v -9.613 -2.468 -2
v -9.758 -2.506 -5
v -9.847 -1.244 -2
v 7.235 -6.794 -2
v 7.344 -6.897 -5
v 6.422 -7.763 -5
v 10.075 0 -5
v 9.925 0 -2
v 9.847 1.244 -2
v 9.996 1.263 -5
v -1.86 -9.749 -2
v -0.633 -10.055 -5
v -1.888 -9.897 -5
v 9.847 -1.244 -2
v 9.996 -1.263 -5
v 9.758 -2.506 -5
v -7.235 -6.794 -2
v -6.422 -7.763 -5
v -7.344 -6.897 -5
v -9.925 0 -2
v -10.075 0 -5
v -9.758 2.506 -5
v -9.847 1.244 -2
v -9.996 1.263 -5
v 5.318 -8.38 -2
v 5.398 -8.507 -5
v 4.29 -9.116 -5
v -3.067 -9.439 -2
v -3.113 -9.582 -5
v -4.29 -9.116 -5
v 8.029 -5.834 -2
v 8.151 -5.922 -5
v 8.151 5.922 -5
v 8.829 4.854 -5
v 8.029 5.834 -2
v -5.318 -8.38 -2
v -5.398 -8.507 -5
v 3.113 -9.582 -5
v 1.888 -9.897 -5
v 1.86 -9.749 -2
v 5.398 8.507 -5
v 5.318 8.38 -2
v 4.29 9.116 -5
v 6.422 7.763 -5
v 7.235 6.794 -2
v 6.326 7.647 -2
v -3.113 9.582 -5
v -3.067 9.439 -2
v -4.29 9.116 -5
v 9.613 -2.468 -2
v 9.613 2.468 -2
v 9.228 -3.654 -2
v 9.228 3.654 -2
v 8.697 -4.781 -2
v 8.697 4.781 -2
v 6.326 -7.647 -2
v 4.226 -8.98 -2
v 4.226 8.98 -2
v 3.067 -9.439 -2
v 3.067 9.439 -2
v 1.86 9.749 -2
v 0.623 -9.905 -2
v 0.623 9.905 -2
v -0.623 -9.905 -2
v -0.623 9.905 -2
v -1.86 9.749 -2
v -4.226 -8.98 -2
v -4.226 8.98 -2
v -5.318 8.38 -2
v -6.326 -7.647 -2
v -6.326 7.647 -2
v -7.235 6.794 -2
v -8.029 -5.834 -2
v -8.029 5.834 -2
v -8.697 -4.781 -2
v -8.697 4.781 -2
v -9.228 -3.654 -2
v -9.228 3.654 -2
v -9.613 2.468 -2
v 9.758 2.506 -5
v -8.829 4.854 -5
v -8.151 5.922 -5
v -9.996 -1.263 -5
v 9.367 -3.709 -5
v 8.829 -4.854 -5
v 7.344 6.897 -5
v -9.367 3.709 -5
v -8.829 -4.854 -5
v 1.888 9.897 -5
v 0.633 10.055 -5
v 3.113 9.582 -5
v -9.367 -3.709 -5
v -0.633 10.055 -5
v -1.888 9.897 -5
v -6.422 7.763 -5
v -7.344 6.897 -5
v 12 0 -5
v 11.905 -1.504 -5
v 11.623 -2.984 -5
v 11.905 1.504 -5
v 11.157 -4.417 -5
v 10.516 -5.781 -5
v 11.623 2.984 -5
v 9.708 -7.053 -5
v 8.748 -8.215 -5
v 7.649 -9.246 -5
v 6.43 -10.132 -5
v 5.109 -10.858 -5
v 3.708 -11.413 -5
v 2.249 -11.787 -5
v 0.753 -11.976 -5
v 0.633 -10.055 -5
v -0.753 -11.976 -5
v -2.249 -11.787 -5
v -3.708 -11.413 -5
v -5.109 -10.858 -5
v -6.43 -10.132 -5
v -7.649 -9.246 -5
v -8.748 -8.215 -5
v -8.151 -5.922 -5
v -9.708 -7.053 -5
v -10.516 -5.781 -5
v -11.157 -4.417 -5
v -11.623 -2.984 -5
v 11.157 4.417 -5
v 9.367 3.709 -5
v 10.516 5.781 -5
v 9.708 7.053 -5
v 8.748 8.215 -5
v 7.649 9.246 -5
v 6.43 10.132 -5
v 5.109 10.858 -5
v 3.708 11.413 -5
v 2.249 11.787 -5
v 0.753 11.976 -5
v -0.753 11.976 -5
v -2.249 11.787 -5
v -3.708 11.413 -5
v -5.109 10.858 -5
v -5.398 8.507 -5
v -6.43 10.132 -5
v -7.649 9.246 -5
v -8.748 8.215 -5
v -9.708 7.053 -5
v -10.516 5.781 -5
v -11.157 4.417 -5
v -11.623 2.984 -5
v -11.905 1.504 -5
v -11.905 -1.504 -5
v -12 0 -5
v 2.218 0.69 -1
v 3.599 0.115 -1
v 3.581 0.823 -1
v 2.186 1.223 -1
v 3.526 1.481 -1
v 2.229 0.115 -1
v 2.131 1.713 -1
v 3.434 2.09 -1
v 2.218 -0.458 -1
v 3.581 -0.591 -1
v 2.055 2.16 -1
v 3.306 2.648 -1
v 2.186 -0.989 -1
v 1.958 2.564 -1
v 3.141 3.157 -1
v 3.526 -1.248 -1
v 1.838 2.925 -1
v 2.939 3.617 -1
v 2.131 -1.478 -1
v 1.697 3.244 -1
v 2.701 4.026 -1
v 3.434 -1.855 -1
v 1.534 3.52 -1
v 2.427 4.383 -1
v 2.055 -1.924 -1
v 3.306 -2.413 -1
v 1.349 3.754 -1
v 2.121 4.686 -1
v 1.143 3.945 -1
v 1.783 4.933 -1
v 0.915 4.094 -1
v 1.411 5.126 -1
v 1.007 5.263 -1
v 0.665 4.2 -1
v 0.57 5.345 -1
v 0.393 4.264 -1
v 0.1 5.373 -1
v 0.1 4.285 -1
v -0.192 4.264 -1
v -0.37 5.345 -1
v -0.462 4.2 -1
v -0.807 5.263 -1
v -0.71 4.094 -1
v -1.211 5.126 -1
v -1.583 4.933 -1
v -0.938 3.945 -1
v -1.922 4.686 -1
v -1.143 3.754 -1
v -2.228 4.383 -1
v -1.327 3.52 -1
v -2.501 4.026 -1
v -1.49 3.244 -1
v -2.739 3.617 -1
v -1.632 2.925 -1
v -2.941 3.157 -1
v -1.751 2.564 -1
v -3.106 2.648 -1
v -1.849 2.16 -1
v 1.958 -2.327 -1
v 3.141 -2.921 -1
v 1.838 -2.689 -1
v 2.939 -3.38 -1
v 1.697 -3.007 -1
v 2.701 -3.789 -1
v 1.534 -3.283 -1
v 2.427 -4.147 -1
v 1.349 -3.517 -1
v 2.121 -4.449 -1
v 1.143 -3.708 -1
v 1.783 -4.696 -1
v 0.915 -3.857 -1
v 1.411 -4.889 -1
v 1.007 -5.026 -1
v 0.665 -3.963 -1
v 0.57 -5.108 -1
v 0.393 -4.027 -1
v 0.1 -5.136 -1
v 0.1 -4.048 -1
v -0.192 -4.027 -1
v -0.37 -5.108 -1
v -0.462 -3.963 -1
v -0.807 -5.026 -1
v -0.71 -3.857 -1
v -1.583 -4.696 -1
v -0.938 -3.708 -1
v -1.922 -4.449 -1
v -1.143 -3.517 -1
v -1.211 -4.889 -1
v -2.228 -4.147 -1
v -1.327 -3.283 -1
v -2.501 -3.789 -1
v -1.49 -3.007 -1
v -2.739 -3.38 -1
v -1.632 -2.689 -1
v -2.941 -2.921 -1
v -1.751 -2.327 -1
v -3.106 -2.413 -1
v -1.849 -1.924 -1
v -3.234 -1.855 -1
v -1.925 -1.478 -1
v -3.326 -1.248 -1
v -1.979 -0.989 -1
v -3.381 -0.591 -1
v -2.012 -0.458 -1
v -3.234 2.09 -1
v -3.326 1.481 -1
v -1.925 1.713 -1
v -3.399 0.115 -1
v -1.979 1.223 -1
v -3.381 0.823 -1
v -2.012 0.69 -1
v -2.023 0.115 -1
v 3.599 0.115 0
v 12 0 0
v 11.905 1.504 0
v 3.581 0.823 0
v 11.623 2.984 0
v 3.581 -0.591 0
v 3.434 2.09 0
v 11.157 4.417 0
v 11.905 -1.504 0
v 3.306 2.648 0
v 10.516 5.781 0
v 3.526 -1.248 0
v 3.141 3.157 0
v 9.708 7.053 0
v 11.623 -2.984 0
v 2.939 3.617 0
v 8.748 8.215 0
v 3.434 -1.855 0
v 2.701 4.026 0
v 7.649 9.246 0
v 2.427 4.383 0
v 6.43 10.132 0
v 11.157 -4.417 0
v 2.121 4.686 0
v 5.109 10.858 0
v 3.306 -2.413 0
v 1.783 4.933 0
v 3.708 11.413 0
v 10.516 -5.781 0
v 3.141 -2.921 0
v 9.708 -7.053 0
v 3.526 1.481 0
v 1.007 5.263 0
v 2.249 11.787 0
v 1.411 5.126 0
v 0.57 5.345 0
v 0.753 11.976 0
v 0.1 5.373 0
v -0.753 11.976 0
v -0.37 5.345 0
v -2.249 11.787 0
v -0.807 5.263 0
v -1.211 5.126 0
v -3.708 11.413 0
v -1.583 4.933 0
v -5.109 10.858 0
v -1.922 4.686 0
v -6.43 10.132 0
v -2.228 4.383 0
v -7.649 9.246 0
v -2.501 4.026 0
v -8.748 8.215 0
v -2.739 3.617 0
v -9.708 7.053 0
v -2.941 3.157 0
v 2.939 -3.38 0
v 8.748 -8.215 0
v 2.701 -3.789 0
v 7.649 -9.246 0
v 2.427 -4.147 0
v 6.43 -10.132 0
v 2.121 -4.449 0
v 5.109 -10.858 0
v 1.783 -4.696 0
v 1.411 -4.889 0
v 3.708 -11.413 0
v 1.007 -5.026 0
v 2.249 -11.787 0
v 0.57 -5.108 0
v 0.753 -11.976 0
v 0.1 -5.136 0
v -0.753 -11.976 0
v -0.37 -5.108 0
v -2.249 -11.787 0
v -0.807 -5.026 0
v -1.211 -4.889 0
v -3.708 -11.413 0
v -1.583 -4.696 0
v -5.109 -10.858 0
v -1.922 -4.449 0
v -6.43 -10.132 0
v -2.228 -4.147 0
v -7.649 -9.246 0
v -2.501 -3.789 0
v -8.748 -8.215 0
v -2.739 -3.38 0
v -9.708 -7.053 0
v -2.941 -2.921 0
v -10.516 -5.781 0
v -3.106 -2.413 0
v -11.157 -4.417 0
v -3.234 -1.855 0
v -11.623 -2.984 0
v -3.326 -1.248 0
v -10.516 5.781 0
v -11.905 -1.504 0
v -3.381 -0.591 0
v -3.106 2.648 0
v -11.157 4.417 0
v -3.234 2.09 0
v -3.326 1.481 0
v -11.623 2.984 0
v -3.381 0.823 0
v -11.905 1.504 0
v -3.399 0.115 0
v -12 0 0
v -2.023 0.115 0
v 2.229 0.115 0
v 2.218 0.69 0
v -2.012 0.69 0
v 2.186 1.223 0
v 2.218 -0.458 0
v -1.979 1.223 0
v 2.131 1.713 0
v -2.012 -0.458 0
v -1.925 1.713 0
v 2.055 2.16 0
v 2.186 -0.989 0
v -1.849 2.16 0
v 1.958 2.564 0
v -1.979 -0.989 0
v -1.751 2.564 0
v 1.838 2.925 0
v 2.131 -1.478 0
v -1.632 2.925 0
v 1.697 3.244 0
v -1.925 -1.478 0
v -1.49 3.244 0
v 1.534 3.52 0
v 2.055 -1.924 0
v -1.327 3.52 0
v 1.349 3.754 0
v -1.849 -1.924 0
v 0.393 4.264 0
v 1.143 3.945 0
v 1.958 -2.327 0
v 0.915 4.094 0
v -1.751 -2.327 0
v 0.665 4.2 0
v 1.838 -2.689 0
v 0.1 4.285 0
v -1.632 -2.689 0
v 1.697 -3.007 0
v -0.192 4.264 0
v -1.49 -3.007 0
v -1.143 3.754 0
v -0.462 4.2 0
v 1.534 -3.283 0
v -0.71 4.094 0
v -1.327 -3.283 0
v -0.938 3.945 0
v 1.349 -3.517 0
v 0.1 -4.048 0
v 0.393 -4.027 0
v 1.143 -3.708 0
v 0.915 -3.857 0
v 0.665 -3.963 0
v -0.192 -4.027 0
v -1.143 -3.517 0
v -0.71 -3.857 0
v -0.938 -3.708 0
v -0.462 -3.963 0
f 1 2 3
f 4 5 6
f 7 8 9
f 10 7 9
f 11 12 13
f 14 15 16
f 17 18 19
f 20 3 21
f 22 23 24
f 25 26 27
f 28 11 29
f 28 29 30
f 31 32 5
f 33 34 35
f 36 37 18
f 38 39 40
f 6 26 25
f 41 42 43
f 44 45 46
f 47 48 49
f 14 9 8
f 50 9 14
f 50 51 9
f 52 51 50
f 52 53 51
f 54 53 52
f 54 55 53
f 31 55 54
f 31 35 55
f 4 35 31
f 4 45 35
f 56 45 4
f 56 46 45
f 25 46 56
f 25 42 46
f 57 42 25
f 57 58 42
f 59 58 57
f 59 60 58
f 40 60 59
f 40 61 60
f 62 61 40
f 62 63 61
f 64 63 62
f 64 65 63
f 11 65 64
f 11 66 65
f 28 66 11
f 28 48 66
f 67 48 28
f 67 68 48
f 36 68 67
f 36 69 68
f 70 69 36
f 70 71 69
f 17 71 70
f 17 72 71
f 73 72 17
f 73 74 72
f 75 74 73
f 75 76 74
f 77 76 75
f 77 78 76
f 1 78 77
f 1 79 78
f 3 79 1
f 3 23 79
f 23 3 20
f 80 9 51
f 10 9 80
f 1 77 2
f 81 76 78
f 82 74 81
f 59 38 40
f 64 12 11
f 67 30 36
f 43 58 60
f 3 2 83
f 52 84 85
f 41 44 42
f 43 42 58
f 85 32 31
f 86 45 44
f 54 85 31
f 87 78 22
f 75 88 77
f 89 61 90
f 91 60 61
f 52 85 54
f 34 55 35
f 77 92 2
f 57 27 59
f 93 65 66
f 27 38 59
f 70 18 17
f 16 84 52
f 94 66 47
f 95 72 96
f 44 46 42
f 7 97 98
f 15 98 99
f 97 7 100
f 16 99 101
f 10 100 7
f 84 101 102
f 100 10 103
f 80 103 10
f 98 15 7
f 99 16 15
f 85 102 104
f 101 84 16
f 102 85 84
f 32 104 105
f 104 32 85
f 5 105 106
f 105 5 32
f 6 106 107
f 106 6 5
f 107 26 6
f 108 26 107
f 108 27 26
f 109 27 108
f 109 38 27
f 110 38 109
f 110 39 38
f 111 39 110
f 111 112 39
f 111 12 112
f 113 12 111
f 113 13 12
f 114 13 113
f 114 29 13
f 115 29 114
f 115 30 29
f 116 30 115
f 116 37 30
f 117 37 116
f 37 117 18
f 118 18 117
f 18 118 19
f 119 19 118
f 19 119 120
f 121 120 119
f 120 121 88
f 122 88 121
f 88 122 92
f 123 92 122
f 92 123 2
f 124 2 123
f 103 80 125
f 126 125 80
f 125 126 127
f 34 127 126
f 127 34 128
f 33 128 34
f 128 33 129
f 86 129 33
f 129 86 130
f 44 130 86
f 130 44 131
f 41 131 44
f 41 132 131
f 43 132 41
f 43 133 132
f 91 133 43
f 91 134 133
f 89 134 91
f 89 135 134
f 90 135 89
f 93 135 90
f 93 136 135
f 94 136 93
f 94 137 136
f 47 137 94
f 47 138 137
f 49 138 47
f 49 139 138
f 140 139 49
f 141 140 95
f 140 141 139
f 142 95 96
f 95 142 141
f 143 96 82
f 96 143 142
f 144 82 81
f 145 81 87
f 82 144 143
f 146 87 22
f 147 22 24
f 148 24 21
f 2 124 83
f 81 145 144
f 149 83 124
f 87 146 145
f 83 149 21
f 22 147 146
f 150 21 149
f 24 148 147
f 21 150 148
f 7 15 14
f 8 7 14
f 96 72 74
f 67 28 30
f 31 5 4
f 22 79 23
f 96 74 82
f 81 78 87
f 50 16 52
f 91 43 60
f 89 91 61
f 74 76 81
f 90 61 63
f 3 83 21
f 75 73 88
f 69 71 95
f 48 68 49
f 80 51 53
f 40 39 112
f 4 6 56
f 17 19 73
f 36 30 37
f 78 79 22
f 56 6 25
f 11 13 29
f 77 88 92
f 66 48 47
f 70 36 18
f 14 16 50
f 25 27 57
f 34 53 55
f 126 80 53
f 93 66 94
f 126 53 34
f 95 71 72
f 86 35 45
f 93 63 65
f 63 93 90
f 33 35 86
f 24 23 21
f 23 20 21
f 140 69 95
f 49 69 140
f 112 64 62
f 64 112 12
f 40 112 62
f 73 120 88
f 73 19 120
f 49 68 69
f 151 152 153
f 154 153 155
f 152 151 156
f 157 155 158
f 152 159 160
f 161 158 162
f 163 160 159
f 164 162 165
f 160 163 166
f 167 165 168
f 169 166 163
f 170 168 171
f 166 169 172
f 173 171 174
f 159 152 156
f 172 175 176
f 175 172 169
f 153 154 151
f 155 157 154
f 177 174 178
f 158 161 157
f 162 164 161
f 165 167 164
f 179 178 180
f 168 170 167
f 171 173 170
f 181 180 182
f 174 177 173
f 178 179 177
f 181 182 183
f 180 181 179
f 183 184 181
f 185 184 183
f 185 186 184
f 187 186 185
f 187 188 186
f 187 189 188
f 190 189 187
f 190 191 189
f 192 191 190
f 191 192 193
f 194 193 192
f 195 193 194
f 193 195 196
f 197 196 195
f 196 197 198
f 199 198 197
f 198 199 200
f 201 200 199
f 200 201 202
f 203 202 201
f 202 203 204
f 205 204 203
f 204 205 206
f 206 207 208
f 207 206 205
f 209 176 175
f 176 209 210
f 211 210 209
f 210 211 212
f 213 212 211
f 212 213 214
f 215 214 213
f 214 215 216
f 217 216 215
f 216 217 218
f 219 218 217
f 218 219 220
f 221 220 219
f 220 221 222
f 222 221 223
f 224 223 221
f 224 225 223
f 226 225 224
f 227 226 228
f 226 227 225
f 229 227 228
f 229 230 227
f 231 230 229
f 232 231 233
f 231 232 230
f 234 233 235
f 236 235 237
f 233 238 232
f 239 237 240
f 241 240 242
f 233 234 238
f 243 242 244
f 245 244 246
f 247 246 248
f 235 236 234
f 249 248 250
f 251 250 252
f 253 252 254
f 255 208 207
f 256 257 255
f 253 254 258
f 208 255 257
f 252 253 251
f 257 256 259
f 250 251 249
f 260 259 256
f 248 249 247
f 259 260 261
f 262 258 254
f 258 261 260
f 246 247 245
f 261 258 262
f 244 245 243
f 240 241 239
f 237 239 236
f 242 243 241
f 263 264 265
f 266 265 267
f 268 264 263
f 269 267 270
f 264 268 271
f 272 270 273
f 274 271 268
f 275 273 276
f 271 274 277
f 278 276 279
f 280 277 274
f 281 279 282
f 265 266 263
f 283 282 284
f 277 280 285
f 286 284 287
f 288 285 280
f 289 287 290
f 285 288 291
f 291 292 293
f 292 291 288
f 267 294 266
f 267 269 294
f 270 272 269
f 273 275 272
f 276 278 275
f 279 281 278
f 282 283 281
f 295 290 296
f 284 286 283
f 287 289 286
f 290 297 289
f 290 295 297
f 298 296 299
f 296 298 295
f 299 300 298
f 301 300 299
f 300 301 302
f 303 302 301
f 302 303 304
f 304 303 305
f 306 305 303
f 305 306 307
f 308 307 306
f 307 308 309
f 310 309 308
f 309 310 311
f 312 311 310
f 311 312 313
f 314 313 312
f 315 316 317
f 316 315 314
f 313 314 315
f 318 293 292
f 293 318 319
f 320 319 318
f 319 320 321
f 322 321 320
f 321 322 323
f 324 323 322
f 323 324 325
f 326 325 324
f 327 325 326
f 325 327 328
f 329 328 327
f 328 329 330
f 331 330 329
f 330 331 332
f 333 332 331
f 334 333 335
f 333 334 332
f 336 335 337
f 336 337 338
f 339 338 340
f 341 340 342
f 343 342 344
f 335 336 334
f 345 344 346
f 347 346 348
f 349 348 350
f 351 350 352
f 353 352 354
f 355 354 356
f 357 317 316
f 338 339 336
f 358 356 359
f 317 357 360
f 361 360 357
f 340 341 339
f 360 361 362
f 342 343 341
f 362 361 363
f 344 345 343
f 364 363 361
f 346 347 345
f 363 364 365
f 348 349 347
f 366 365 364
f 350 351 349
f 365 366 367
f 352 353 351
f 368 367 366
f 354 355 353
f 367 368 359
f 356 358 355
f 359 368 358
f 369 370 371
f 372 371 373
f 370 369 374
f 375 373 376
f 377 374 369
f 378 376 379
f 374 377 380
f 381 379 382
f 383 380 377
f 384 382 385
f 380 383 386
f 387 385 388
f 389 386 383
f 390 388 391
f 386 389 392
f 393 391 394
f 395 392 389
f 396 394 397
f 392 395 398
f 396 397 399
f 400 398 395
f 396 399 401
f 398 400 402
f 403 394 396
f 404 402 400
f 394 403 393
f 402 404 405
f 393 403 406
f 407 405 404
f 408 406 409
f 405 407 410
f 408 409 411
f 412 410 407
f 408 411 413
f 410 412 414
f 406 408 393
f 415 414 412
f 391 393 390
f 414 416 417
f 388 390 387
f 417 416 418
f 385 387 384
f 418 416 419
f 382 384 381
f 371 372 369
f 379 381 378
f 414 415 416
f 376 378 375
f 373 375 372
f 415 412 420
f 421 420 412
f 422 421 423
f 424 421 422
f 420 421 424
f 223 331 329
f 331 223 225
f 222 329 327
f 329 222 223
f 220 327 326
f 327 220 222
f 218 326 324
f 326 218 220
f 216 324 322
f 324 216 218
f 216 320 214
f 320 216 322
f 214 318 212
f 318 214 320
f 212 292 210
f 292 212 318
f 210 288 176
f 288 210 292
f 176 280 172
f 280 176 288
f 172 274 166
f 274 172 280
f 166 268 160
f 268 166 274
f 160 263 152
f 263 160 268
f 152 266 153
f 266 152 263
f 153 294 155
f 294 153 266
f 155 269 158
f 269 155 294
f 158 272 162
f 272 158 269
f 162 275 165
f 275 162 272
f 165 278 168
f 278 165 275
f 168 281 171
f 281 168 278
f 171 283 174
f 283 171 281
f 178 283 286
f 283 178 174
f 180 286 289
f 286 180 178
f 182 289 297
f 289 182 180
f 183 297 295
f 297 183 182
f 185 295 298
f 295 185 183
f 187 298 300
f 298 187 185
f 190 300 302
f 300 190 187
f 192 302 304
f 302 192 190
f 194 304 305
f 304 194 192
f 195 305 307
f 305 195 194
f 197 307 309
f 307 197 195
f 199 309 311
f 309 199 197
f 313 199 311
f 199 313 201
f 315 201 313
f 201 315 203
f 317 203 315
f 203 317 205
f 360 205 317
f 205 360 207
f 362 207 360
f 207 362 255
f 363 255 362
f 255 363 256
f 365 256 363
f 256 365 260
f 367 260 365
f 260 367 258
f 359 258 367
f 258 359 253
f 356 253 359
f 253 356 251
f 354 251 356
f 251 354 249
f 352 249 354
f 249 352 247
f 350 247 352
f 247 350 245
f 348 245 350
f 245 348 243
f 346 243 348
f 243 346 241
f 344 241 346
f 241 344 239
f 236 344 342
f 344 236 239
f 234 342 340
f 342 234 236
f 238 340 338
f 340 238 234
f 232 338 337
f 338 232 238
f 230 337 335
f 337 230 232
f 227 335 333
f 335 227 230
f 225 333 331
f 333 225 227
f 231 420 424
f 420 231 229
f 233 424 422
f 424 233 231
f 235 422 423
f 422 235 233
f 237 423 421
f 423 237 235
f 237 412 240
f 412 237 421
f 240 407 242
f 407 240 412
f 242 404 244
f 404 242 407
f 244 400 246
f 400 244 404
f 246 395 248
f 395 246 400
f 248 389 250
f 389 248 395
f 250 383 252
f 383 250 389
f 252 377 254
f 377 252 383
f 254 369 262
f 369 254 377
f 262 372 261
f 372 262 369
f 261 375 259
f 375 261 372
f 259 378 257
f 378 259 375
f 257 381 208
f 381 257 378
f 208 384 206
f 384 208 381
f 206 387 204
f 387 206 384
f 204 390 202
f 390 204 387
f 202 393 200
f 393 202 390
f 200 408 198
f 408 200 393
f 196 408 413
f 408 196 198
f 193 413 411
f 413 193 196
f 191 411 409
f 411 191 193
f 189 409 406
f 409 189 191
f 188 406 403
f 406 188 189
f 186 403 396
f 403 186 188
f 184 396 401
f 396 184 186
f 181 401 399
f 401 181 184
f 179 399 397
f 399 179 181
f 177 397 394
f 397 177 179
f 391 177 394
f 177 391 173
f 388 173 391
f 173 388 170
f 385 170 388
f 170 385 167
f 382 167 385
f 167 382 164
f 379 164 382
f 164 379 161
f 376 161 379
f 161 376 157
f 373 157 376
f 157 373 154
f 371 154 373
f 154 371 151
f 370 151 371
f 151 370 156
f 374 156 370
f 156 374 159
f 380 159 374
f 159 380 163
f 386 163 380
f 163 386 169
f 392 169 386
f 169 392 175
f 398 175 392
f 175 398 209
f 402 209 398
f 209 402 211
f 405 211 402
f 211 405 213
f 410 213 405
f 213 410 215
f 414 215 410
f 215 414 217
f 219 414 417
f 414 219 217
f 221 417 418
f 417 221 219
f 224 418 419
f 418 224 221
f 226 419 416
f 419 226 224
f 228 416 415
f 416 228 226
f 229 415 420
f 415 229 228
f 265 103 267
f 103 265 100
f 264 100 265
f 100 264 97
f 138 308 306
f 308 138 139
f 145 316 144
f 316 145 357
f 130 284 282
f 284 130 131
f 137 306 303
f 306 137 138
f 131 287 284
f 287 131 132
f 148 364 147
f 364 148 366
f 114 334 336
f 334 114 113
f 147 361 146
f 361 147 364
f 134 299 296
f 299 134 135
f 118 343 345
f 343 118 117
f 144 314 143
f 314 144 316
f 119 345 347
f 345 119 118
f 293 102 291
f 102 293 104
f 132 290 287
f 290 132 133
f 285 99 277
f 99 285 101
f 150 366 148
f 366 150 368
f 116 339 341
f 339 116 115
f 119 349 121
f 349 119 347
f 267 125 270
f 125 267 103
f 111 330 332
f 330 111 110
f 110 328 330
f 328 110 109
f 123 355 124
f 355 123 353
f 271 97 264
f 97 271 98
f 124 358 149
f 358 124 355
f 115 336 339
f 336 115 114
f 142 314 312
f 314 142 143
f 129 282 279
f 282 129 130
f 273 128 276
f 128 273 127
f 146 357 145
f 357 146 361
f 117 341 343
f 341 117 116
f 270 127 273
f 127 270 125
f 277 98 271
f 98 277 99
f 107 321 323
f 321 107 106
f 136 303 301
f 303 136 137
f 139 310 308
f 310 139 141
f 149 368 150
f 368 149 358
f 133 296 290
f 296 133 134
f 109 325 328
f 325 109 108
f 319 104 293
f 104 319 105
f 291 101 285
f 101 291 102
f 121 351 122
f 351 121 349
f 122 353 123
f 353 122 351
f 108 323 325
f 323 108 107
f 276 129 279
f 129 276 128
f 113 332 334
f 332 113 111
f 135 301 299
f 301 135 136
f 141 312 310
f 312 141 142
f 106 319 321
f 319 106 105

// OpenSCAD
$fn = 50;

difference() {
	union() {
		translate(v = [0, 0, -5.0]) {
			cylinder(h = 5, r = 12.0);
		}
	}
	union() {
		#translate(v = [0, 0, -5.0]) {
			cylinder(h = 3, r1 = 10.075, r2 = 9.925);
		}
		translate(v = [0, 0, -1]) {
			linear_extrude(height = 1) {
				text(font = "Impact", halign = "center", size = 10, text = "0", valign = "center");
			}
		}
	}
}
